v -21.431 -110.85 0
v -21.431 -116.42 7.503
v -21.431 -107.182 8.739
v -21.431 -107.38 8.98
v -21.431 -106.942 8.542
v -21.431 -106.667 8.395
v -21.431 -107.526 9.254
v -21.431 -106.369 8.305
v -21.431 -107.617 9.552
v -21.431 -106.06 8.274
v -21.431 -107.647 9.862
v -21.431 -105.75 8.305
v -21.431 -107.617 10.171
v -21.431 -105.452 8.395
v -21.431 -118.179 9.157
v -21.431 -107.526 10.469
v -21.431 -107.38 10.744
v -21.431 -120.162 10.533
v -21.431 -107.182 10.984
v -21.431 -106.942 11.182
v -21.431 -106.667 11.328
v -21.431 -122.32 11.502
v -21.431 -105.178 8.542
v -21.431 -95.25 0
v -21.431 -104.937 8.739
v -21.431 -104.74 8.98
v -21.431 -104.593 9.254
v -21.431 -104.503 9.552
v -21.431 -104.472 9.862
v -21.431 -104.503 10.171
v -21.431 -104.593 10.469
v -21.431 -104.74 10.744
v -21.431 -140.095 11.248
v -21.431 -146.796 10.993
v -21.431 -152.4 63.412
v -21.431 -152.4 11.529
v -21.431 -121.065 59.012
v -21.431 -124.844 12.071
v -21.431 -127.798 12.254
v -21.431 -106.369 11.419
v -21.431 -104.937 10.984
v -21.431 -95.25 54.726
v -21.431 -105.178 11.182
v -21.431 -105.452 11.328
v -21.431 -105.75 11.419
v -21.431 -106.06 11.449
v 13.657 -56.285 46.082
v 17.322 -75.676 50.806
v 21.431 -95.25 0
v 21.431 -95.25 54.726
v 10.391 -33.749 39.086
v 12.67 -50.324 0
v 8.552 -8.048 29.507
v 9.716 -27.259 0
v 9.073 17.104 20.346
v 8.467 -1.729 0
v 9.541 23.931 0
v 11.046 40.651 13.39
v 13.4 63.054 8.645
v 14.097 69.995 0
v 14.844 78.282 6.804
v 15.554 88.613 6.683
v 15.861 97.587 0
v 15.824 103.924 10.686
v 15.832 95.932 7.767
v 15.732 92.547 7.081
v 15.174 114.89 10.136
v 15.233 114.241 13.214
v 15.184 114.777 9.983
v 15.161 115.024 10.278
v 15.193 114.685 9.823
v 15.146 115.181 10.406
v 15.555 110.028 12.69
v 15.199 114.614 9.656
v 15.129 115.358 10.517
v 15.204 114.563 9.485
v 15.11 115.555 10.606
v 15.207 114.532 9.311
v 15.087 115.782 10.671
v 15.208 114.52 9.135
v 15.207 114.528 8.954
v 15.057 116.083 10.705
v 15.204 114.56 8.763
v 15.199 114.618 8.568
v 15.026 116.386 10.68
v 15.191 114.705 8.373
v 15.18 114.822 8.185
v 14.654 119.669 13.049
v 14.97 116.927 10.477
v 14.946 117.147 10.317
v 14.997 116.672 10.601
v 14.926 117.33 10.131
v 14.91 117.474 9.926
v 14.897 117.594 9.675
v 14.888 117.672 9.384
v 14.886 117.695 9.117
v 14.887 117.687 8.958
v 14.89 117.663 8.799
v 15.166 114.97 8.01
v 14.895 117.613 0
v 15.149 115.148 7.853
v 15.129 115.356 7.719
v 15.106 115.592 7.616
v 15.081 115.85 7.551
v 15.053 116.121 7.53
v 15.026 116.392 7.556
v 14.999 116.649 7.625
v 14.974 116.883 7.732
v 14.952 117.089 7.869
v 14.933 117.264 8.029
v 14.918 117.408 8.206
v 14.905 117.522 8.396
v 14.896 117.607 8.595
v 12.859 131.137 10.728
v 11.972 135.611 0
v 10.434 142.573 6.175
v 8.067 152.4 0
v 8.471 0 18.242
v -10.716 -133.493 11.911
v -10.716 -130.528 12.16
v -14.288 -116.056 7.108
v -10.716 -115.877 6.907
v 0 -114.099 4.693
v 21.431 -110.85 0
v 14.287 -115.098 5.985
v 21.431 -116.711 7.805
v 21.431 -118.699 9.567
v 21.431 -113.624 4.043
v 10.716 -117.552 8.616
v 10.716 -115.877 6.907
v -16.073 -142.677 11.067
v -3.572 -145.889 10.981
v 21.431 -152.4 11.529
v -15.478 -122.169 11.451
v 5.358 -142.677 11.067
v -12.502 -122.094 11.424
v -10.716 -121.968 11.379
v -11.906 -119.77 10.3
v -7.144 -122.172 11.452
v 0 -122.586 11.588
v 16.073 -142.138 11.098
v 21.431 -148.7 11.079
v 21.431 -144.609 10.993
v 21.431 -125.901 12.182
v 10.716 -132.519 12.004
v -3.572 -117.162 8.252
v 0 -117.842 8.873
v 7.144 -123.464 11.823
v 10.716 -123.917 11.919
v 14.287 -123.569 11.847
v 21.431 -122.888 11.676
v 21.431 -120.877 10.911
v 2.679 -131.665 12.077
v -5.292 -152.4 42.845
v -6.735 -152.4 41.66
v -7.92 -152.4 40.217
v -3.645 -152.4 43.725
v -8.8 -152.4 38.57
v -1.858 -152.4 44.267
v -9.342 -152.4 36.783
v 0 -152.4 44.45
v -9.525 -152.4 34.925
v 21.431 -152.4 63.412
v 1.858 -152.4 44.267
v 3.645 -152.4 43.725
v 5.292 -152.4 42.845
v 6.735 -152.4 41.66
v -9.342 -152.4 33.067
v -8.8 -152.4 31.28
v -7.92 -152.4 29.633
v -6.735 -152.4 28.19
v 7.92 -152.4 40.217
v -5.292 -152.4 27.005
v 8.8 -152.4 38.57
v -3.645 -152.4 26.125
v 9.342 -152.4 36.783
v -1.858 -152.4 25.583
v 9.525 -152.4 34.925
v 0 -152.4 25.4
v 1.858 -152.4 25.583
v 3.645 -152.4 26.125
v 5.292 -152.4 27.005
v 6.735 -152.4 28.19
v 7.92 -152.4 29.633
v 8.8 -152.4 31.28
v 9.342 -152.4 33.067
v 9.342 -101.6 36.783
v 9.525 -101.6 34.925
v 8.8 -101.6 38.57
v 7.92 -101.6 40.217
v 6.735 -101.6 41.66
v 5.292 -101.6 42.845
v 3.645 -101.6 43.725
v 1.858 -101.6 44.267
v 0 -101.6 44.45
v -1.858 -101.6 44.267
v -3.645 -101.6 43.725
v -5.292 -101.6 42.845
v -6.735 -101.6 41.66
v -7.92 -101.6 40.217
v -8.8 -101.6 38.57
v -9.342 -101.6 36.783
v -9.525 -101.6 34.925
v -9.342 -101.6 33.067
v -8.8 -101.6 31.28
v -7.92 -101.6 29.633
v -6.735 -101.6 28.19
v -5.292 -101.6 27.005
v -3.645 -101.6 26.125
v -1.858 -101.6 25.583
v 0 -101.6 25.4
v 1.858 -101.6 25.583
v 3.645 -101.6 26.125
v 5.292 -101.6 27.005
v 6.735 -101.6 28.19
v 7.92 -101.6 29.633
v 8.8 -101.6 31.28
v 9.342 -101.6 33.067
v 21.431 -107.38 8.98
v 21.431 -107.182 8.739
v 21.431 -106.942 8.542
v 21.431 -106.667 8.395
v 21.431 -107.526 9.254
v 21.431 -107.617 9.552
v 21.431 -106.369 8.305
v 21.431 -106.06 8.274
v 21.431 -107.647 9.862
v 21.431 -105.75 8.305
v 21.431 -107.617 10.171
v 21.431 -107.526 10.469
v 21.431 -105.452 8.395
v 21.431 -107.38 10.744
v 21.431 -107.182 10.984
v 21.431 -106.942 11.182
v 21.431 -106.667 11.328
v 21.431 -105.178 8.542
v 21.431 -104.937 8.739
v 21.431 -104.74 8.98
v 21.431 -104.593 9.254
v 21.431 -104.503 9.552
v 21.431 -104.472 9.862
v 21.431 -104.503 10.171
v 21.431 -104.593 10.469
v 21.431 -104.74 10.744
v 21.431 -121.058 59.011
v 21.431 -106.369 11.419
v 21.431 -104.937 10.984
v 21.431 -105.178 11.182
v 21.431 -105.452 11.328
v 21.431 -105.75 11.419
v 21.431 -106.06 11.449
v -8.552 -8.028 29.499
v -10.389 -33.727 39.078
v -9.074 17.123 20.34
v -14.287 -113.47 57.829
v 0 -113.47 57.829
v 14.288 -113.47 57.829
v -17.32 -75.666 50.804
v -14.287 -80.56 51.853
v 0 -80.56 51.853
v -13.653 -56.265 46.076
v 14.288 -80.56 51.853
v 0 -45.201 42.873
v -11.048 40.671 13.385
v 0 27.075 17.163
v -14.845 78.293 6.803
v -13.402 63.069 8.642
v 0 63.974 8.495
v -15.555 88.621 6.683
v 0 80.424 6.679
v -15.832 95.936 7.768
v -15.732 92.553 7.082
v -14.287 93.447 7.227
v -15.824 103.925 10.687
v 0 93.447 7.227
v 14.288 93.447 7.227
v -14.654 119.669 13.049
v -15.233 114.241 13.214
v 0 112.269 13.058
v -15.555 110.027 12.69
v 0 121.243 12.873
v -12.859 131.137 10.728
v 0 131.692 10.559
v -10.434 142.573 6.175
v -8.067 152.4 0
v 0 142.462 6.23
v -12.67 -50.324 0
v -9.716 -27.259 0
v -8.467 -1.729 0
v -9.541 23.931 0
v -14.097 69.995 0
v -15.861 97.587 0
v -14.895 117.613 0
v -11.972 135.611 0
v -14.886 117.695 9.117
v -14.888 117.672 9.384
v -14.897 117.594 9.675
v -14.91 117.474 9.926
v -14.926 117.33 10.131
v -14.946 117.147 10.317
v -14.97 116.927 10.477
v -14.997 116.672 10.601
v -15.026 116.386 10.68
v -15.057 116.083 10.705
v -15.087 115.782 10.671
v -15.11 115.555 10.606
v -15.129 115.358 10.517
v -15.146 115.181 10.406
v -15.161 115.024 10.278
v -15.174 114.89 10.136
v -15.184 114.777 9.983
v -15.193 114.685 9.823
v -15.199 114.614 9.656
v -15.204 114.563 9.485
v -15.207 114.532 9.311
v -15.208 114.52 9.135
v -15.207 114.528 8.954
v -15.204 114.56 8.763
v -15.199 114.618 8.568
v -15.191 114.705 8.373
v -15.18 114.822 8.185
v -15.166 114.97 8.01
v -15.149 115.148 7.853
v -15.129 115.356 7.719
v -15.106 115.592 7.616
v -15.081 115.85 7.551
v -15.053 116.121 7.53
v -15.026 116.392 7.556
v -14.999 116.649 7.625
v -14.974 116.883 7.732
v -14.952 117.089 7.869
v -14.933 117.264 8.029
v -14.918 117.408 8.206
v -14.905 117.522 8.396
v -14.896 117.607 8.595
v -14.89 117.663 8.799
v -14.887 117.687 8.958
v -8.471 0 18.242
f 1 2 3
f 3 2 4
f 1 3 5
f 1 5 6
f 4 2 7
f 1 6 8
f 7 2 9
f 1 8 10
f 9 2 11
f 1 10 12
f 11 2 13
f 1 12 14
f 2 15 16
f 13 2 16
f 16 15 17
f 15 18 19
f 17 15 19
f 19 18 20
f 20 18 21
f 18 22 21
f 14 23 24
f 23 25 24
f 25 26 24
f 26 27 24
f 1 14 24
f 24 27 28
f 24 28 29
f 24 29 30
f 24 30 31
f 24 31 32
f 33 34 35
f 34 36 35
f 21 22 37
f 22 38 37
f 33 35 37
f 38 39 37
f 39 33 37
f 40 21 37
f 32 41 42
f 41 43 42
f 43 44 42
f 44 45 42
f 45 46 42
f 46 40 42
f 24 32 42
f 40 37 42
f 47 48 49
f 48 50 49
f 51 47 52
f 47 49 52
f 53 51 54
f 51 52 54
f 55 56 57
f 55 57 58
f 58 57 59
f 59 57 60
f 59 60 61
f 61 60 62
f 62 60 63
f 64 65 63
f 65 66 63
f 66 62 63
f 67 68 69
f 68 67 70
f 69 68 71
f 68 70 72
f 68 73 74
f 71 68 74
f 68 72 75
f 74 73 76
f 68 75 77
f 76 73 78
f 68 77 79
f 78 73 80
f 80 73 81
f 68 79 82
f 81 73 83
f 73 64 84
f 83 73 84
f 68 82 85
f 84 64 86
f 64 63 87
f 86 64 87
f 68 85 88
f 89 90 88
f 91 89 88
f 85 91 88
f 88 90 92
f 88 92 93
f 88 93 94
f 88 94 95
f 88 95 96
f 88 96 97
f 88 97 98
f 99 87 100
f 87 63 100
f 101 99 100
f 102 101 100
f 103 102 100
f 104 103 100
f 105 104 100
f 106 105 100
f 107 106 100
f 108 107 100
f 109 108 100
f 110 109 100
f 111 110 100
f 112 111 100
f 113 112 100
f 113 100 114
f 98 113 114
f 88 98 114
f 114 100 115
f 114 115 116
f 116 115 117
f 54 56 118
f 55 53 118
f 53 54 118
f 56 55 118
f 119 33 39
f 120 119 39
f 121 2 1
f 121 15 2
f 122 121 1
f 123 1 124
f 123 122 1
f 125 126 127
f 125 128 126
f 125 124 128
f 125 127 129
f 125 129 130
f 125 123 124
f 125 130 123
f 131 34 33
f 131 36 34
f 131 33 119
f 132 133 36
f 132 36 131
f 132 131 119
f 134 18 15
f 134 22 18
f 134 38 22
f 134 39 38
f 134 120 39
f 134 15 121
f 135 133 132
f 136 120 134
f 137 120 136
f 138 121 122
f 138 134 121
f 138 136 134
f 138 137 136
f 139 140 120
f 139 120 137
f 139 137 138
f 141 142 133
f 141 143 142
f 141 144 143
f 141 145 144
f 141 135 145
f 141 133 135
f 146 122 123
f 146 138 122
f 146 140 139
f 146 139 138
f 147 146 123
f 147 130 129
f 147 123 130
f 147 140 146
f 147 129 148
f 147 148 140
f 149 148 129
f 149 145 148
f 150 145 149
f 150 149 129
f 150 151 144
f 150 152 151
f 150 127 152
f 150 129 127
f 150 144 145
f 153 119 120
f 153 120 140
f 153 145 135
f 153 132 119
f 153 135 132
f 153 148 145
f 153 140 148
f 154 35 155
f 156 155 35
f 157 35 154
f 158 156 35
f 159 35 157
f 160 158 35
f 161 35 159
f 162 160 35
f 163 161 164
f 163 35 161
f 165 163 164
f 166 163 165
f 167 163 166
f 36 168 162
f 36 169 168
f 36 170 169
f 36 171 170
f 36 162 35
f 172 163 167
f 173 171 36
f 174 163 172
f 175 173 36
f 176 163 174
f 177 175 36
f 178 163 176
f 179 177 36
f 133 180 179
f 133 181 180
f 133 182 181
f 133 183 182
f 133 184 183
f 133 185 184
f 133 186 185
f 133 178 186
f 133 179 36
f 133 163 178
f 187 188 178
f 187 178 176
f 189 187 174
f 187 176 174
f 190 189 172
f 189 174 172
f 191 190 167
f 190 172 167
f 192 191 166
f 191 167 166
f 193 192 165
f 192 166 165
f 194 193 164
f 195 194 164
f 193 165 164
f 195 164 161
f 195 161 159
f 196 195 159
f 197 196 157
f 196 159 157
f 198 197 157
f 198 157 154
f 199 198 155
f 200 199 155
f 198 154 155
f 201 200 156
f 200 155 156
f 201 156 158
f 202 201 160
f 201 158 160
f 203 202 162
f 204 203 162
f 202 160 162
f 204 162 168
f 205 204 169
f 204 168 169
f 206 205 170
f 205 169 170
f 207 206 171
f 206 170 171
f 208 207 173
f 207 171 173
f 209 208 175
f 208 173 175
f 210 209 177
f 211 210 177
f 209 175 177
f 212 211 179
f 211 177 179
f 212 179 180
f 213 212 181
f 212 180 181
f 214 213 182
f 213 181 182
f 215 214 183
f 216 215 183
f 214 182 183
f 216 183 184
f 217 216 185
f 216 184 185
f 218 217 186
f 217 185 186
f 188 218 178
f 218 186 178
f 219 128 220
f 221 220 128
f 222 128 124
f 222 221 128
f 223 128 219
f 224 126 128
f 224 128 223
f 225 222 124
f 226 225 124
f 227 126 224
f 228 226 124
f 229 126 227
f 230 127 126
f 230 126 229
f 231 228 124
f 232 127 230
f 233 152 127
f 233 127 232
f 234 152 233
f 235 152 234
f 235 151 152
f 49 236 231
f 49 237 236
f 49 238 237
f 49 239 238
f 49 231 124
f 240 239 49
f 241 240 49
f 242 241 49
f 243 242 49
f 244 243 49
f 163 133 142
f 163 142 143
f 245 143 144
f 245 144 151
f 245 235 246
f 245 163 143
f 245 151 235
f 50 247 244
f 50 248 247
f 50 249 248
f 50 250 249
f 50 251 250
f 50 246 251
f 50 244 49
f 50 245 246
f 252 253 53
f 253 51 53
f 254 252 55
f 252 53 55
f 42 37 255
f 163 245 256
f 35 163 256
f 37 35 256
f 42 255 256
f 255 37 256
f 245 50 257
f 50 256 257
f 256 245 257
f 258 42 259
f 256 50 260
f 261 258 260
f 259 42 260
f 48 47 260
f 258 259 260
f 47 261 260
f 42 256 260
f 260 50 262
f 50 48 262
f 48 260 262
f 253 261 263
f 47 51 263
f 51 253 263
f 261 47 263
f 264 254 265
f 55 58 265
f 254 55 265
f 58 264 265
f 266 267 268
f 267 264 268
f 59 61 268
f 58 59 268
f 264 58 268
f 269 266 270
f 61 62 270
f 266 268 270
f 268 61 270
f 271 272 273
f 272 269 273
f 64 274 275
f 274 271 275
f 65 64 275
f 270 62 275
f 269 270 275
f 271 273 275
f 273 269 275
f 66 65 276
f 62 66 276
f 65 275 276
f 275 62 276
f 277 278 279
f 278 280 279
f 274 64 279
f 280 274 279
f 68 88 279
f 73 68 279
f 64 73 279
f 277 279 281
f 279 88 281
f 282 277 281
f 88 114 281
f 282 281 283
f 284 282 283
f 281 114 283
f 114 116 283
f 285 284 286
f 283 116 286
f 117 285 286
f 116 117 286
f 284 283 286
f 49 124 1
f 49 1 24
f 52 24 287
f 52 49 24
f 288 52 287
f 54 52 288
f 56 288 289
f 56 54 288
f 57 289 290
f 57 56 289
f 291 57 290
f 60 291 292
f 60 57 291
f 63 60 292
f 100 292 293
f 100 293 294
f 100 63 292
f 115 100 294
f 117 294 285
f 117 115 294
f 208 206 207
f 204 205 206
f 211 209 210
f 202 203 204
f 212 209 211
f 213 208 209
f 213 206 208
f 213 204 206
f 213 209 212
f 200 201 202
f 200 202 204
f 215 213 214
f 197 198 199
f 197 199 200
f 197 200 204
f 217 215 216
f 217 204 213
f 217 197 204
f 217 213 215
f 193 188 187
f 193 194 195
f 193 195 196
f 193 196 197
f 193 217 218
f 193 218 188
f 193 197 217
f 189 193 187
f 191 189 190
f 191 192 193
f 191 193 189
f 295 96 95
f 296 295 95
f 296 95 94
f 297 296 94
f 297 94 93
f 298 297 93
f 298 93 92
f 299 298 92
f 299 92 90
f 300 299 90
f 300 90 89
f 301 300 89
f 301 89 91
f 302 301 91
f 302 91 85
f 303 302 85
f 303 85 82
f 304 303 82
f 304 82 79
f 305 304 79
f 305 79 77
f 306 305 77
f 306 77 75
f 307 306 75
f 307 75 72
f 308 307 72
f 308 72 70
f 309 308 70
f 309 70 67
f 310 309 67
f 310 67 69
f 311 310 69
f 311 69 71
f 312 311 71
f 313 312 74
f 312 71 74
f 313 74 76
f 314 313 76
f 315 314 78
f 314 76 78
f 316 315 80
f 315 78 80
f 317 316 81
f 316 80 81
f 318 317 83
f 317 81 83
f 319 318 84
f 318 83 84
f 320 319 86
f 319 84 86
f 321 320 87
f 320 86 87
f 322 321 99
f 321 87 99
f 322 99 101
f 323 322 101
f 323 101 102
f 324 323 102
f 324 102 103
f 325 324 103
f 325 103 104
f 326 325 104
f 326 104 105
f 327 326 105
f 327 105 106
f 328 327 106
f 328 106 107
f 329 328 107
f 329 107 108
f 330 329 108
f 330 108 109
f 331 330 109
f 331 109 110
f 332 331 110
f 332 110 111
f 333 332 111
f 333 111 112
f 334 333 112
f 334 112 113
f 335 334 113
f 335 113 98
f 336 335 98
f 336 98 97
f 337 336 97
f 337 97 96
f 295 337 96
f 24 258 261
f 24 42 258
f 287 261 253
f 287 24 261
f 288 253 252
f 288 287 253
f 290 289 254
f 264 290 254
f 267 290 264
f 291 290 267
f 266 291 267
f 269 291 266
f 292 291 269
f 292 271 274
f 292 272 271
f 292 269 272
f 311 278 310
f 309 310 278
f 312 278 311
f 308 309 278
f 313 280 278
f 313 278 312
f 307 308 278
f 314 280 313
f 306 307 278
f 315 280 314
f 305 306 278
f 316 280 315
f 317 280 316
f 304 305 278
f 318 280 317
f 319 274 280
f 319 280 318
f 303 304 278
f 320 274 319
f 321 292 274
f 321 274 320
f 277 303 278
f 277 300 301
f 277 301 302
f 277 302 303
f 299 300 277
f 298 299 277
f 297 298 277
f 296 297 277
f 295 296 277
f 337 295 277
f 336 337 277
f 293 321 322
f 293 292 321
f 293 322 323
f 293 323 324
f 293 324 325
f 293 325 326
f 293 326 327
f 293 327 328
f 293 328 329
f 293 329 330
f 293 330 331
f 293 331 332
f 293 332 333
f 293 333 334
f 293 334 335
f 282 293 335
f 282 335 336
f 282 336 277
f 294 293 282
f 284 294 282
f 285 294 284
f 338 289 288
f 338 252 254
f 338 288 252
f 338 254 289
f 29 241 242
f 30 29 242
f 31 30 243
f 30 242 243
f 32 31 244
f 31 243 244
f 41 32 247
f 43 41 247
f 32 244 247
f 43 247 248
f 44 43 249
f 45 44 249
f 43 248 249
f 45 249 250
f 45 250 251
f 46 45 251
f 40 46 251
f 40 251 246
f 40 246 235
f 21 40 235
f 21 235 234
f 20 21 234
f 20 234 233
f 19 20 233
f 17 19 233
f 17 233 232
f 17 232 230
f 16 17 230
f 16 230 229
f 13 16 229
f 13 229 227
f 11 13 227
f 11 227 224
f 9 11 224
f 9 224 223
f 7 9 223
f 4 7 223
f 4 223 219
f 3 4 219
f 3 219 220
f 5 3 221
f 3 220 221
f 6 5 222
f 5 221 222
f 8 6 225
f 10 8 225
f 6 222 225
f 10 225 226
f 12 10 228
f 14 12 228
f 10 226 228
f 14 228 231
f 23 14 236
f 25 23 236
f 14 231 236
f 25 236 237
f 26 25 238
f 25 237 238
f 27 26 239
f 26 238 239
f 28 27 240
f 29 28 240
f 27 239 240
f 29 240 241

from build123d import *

# Parameters (mm, degrees)
F1_DEPTH = 21.43125
F2_R     = 9.525
F3_DEPTH = 50.8
F4_R     = 1.5875
F6_DEPTH = 42.8635
F7_DEPTH = 63.4134694142
F8_DEPTH = 42.8635001
F9_DEPTH = 42.8635001


with BuildPart() as f1:
    # F0 (on Right) → F1 (new body, symmetric)
    with BuildSketch(Plane.YZ):
        Polygon((-152.4, 69.85), (-152.4, 0), (152.4, 0), (152.4, 19.05), align=None)
    extrude(amount=F1_DEPTH, both=True)

    # F2 (on face) → F3 (cut)
    with BuildSketch(Plane.XZ.offset(152.4)):
        with Locations((0, 34.925)):
            Circle(F2_R)
    extrude(amount=-F3_DEPTH, mode=Mode.SUBTRACT)

    # F4 (on face) → F6 (cut, through all)
    with BuildSketch(Plane.YZ.offset(21.43125)):
        with Locations((-106.0597673059, 9.8616983742)):
            Circle(F4_R)
        with Locations((116.1075383425, 9.1174189001)):
            Circle(F4_R)
        with BuildLine():
            Line((-152.4, 69.85), (-152.4, 63.4124693142))
            add(Edge.make_bspline(
                [(-152.4, 63.4124693142), (-140.3470349673, 61.7861947864), (-112.4716388906, 58.1089697392), (-41.9671579921, 45.2289528531), (21.730693014, 15.3220693615), (94.082386935, 1.9101160851), (110.7917005476, 17.5281988656), (140.2180244224, 9.525), (152.4, 0)],
                knots=[0, 0, 0, 0, 0.1474993379, 0.3441234589, 0.5501232287, 0.742802432, 0.8472081521, 1, 1, 1, 1], degree=3))
            Line((152.4, 0), (152.4, 19.05))
            Line((152.4, 19.05), (-152.4, 69.85))
        make_face()
    extrude(amount=-F6_DEPTH, mode=Mode.SUBTRACT)

    # F5 (on face) → F7 (cut, through all)
    with BuildSketch(Plane(origin=(0, 0, 0), x_dir=(1, 0, 0), z_dir=(0, 0, -1))):
        with BuildLine():
            add(Edge.make_bspline(
                [(21.43125, 95.25), (14.8559240611, 64.4513498529), (1.560289343, 2.1749538276), (21.1937212181, -98.8837359072), (11.9525595695, -136.5598896787), (8.0673163757, -152.4)],
                knots=[0, 0, 0, 0, 0.3618657615, 0.7317104925, 1, 1, 1, 1], degree=3))
            Line((8.0673163757, -152.4), (21.43125, -152.4))
            Line((21.43125, -152.4), (21.43125, 95.25))
        make_face()
        with BuildLine():
            add(Edge.make_bspline(
                [(-21.43125, 95.25), (-14.8559240611, 64.4513498529), (-1.560289343, 2.1749538276), (-21.1937212181, -98.8837359072), (-11.9525595695, -136.5598896787), (-8.0673163757, -152.4)],
                knots=[0, 0, 0, 0, 0.3618657615, 0.7317104925, 1, 1, 1, 1], degree=3))
            Line((-21.43125, 95.25), (-21.43125, -152.4))
            Line((-21.43125, -152.4), (-8.0673163757, -152.4))
        make_face()
    extrude(amount=-F7_DEPTH, mode=Mode.SUBTRACT)

    # F4 (on face) → F8 (cut, through all)
    with BuildSketch(Plane.YZ.offset(21.43125)):
        with BuildLine():
            add(Edge.make_bspline(
                [(-152.4, 11.5290285958), (-141.2287506061, 9.525), (-121.4122565006, 17.0300769596), (-114.0199033563, 4.6339851154), (-110.8501440775, 0)],
                knots=[0, 0, 0, 0, 0.5734675537, 1, 1, 1, 1], degree=3))
            Line((-152.4, 11.5290285958), (-152.4, 0))
            Line((-152.4, 0), (-110.8501440775, 0))
        make_face()
    extrude(amount=-F8_DEPTH, mode=Mode.SUBTRACT)

    # F4 (on face) → F9 (cut, through all)
    with BuildSketch(Plane.YZ.offset(21.43125)):
        with Locations((-106.0597673059, 9.8616983742)):
            Circle(F4_R)
        with Locations((116.1075383425, 9.1174189001)):
            Circle(F4_R)
    extrude(amount=-F9_DEPTH, mode=Mode.SUBTRACT)


solid = f1.part
